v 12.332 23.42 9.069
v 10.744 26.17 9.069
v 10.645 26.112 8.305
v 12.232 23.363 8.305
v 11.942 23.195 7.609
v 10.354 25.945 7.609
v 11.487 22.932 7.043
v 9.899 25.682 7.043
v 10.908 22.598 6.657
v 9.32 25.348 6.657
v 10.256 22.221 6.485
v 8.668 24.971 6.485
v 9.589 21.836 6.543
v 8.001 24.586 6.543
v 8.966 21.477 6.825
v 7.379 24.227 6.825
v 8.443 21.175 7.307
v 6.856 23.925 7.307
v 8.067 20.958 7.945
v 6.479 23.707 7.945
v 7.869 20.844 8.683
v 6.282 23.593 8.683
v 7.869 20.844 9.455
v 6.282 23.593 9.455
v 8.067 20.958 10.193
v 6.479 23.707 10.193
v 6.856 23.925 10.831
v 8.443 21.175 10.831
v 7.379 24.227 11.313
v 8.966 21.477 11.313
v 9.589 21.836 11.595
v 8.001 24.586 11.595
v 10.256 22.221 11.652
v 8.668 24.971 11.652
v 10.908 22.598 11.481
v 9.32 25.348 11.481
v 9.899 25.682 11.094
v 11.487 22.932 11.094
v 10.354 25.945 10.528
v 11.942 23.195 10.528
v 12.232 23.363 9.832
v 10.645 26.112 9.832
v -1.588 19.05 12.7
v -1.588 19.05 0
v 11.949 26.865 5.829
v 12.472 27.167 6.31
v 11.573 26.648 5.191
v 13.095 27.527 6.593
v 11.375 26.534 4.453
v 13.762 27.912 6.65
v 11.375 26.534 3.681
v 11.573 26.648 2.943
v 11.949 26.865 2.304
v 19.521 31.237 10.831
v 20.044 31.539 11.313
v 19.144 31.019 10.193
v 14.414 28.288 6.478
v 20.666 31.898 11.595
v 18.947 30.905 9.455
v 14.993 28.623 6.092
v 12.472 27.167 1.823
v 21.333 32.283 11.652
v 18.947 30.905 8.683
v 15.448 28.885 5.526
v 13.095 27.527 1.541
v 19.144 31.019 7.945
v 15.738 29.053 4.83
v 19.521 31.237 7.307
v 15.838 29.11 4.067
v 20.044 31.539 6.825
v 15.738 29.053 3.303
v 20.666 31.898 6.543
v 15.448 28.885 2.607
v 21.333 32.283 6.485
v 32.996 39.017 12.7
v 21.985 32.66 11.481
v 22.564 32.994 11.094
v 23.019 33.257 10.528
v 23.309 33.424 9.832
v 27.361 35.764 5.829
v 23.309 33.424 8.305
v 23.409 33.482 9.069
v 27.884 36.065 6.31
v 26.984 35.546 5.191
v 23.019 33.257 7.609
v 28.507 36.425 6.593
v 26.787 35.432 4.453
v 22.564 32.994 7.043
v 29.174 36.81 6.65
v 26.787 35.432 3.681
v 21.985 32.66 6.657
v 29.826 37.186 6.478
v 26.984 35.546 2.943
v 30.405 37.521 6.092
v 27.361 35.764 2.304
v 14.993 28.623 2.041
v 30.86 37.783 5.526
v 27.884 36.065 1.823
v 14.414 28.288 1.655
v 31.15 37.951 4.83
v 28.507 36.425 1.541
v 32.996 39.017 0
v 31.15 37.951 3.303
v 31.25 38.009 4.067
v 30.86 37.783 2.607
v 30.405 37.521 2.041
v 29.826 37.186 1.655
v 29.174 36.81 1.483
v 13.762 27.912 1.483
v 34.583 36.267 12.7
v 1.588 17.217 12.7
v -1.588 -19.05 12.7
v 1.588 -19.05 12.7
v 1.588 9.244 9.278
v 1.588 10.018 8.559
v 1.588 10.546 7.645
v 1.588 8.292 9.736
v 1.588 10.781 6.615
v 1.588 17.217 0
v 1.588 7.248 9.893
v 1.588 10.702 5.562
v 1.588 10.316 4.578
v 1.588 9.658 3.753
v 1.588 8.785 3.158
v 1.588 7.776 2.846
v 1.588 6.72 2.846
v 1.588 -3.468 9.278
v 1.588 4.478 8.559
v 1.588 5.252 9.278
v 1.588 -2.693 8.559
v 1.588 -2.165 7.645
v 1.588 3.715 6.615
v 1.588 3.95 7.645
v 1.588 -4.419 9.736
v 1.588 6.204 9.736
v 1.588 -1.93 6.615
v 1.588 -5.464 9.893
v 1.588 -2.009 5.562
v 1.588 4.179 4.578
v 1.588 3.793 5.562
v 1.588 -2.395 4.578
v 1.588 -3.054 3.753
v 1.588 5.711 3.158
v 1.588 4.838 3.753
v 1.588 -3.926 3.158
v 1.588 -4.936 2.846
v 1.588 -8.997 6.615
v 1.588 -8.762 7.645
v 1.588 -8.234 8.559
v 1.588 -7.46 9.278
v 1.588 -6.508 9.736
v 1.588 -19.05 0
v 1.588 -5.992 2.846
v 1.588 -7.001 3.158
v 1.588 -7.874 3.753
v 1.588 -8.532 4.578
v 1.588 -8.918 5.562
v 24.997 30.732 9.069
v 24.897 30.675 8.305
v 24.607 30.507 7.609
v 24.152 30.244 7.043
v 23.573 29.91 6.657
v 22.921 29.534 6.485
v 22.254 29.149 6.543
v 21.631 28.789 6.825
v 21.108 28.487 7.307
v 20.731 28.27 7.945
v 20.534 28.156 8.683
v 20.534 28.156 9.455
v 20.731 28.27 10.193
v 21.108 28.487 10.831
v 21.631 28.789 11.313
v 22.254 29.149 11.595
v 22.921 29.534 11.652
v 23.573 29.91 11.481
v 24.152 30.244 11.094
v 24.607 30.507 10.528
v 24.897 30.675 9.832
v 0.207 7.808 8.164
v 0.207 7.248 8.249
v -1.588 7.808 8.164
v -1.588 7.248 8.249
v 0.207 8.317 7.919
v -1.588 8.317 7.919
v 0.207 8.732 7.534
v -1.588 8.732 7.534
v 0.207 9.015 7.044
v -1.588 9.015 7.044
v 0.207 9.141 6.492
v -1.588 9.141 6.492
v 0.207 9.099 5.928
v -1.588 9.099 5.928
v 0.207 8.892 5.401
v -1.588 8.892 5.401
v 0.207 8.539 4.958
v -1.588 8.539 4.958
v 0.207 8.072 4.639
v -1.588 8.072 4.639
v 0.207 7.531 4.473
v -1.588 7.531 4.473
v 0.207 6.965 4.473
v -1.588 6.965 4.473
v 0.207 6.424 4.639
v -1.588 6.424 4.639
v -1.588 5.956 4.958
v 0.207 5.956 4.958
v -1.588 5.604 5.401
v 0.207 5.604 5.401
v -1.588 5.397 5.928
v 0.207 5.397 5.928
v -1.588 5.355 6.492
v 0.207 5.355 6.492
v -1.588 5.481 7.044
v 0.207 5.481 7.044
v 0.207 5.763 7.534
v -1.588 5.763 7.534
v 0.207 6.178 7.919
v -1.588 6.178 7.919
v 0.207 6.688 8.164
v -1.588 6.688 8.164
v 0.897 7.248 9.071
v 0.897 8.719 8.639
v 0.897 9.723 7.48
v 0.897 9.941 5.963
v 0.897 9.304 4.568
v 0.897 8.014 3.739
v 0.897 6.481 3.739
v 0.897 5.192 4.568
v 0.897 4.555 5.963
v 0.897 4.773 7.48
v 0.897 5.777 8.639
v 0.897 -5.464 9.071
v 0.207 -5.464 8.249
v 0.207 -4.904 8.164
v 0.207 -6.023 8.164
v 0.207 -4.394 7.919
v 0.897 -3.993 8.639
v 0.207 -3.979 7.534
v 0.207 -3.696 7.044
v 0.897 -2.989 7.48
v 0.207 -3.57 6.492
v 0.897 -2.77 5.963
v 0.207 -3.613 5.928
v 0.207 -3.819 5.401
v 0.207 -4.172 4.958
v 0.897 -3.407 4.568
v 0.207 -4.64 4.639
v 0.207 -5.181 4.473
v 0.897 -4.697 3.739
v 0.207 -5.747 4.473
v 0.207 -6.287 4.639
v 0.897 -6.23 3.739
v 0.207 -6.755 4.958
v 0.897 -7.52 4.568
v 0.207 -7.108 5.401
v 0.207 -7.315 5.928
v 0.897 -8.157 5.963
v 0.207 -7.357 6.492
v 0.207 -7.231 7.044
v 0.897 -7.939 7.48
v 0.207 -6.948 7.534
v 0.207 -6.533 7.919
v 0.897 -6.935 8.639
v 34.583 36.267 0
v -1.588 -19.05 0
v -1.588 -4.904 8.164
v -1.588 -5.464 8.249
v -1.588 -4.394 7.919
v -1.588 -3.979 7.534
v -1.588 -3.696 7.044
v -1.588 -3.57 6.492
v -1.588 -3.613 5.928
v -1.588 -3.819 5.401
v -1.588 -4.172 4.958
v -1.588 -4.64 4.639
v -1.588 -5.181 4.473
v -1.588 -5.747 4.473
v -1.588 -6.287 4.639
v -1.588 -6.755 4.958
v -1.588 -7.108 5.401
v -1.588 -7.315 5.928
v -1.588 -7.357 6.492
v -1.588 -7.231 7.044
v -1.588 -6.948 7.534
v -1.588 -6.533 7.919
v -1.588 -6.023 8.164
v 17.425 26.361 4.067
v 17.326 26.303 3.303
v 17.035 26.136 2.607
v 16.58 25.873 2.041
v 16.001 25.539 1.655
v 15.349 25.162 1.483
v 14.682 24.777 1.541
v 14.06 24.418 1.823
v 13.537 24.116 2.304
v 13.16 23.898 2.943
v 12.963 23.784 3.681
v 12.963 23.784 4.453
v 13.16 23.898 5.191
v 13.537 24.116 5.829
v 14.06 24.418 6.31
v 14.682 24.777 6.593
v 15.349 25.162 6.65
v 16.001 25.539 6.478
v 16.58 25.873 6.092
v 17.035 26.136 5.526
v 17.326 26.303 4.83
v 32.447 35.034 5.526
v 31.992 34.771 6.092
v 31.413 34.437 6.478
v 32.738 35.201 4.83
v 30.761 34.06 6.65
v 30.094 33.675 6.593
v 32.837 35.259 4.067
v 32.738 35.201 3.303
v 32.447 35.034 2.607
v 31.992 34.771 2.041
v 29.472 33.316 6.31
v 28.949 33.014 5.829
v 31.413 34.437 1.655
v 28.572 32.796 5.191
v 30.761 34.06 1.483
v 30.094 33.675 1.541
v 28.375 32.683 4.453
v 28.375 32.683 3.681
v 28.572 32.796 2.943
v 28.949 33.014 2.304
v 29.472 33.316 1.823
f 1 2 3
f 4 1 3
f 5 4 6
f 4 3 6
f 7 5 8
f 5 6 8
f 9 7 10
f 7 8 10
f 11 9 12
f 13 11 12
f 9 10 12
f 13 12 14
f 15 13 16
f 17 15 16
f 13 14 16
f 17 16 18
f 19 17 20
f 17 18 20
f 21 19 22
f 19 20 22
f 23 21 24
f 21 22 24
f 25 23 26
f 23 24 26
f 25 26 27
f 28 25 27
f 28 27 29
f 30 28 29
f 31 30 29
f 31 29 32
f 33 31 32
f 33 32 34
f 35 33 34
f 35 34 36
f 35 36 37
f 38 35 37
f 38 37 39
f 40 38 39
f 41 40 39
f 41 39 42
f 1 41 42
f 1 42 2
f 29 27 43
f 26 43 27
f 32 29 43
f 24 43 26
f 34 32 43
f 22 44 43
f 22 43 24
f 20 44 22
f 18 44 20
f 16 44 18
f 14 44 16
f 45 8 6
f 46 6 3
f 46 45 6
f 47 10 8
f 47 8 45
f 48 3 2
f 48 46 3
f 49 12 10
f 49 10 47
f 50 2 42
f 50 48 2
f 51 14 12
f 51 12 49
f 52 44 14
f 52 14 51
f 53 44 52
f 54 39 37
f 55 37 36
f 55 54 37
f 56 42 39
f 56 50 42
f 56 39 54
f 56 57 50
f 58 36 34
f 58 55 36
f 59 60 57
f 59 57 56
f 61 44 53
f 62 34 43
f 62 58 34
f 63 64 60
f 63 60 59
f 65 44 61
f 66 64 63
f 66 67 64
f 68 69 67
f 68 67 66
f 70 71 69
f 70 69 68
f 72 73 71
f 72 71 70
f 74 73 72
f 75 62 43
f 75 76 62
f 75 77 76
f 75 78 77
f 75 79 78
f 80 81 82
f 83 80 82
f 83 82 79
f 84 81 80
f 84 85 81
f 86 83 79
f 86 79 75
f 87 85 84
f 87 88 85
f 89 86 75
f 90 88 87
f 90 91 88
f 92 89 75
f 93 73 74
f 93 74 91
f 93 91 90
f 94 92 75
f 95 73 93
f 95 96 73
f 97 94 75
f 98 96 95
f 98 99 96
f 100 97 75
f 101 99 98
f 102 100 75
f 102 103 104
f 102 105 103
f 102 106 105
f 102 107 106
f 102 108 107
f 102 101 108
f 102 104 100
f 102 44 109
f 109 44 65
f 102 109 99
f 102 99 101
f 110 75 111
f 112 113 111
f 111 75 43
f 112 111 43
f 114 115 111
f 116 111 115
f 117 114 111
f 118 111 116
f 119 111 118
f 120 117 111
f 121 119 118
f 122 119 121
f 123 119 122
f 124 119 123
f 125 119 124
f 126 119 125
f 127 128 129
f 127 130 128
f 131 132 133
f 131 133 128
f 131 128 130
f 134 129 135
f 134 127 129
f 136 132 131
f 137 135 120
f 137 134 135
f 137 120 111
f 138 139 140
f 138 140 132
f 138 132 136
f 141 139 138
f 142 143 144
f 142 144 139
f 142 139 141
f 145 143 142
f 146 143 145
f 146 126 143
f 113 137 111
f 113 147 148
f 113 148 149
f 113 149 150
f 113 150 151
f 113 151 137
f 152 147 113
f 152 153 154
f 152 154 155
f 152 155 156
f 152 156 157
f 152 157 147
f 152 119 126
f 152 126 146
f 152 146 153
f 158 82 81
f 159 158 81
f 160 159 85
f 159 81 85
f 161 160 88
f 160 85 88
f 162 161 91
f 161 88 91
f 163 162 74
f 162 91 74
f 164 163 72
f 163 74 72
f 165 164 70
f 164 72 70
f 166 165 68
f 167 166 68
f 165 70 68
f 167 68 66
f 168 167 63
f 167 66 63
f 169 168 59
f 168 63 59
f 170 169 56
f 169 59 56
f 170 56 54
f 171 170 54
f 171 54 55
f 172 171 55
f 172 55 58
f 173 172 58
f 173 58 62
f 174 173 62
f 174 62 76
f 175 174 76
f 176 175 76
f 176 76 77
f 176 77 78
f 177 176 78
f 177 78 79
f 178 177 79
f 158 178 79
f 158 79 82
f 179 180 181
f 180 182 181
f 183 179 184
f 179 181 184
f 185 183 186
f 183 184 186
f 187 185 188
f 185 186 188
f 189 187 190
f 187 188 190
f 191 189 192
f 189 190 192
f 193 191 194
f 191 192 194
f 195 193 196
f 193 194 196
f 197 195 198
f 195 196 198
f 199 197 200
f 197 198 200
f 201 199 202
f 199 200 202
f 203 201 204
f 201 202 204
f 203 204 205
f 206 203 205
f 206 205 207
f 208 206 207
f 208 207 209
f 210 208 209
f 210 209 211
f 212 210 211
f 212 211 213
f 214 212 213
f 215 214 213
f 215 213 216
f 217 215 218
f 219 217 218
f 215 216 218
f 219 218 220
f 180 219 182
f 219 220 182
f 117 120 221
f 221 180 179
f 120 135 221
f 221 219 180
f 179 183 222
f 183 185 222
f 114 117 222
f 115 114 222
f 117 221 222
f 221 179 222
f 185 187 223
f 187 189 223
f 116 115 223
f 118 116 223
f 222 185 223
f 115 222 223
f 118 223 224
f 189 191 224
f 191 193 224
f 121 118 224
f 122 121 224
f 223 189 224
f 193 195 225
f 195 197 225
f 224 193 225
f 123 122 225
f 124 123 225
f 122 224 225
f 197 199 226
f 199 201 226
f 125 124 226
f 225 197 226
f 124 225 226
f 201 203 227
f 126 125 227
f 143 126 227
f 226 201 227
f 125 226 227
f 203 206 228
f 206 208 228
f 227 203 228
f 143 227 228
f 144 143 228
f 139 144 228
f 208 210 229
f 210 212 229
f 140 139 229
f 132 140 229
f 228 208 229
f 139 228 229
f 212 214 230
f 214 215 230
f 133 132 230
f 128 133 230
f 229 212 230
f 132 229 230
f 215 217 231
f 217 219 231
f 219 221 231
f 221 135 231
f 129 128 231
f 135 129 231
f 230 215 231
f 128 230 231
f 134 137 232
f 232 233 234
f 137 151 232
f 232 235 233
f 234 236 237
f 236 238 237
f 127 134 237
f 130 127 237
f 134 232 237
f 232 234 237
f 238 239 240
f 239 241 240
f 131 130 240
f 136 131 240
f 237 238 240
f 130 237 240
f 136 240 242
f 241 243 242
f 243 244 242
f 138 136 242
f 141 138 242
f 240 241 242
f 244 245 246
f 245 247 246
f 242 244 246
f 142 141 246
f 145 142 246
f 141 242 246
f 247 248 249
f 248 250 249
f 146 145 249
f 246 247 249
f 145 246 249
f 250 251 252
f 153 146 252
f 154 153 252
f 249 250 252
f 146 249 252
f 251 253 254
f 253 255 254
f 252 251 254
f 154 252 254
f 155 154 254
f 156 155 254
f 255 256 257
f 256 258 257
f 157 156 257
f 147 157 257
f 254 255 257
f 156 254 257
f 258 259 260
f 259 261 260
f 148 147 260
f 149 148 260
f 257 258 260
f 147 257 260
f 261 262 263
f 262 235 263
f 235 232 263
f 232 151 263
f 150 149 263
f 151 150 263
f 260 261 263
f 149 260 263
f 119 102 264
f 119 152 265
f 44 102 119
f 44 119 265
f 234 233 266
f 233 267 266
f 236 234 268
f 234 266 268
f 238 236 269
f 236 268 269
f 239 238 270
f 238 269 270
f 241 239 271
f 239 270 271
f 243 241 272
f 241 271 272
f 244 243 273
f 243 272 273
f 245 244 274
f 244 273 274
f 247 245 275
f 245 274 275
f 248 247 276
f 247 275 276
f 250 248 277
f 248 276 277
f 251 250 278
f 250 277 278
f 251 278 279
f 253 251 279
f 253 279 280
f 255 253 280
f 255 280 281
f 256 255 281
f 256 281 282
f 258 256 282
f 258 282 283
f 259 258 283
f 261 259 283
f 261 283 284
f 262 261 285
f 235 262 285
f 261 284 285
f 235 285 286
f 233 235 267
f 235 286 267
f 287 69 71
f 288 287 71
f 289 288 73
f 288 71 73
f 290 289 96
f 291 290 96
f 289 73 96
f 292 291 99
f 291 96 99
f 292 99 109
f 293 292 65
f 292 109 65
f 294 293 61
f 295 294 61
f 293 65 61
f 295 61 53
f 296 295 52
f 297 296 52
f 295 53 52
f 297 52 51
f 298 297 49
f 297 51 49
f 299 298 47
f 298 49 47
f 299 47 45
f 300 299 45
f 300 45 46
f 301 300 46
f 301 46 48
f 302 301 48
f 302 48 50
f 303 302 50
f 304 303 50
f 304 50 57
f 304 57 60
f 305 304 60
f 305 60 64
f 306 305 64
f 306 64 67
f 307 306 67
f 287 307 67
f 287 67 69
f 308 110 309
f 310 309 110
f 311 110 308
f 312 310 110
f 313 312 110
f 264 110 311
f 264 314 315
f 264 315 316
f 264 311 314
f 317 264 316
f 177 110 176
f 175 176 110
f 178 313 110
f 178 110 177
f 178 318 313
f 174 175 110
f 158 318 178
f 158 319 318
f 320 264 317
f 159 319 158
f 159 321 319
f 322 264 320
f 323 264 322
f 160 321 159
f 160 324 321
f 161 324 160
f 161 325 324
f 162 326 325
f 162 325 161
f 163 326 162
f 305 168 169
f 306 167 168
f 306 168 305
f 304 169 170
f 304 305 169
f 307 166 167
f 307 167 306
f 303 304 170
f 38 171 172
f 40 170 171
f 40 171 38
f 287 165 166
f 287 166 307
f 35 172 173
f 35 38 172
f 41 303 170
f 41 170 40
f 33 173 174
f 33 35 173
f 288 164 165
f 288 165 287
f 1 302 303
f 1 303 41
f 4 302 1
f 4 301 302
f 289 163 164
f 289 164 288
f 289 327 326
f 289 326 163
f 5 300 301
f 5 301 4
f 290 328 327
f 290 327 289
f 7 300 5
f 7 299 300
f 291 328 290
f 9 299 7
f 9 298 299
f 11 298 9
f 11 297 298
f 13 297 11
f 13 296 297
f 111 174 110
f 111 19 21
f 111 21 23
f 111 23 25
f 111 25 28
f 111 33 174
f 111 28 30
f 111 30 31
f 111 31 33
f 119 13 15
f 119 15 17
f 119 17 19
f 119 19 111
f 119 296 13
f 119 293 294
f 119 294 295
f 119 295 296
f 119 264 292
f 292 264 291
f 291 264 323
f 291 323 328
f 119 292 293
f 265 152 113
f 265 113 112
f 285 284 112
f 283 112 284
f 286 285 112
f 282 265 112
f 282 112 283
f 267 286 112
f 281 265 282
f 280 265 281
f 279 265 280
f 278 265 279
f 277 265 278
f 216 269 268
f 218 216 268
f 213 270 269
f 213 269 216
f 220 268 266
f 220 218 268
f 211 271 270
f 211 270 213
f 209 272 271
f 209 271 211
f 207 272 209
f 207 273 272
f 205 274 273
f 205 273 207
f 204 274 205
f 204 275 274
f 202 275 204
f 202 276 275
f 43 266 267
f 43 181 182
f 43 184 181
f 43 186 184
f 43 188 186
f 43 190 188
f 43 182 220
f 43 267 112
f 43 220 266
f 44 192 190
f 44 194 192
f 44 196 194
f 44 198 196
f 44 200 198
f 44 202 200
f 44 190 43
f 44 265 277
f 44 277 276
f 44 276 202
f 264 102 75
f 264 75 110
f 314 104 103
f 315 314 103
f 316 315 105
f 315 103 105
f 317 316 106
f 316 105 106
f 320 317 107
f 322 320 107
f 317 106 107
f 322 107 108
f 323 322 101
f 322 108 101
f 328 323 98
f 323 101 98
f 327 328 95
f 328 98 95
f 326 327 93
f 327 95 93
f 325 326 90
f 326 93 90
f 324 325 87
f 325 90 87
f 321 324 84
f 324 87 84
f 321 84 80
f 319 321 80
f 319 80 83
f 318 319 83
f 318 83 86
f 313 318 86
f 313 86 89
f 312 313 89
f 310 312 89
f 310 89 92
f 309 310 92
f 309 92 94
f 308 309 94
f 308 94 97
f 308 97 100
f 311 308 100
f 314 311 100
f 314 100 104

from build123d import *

# Parameters (mm, degrees)
BOSS_EXTRUDE1_DEPTH                               = 12.7
CSK_FOR_6_FLAT_HEAD_MACHINE_SCREW_100_D           = 3.7973
CSK_FOR_6_FLAT_HEAD_MACHINE_SCREW_100_DEPTH       = 12.7
CSK_FOR_6_FLAT_HEAD_MACHINE_SCREW_100_CSINK_D     = 7.0866
CSK_FOR_6_FLAT_HEAD_MACHINE_SCREW_100_CSINK_ANGLE = 100
CSK_FOR_6_FLAT_HEAD_MACHINE_SCREW_100_TIP         = 1.140824014
F_6_0_204_DIAMETER_HOLE1_D                        = 5.1816
F_6_0_204_DIAMETER_HOLE1_DEPTH                    = 12.7
F_6_0_204_DIAMETER_HOLE1_TIP                      = 1.556709692


with BuildPart() as part:
    # Sketch1 → Boss-Extrude1 (new body)
    with BuildSketch(Plane.XY):
        Polygon((-1.5875, 19.05), (32.995567884, 39.016543552), (34.583067884, 36.266912895), (1.5875, 17.216912895), (1.5875, -19.05), (-1.5875, -19.05), align=None)
    extrude(amount=BOSS_EXTRUDE1_DEPTH)

    # CSK for #6 Flat Head Machine Screw (100)1
    with Locations(Plane(origin=(1.5875, 0, 0), x_dir=(0, 0, -1), z_dir=(1, 0, 0))):
        with Locations((-6.35, 7.247907124), (-6.35, -5.463667213)):
            CounterSinkHole(CSK_FOR_6_FLAT_HEAD_MACHINE_SCREW_100_D / 2, CSK_FOR_6_FLAT_HEAD_MACHINE_SCREW_100_CSINK_D / 2, depth=CSK_FOR_6_FLAT_HEAD_MACHINE_SCREW_100_DEPTH, counter_sink_angle=CSK_FOR_6_FLAT_HEAD_MACHINE_SCREW_100_CSINK_ANGLE)
            with Locations((0, 0, -(CSK_FOR_6_FLAT_HEAD_MACHINE_SCREW_100_DEPTH + CSK_FOR_6_FLAT_HEAD_MACHINE_SCREW_100_TIP / 2))):  # 118° drill point
                Cone(0, CSK_FOR_6_FLAT_HEAD_MACHINE_SCREW_100_D / 2, CSK_FOR_6_FLAT_HEAD_MACHINE_SCREW_100_TIP, mode=Mode.SUBTRACT)

    # #6 (0.204) Diameter Hole1
    with Locations(Plane(origin=(-7.058266971, 12.225277007, 0), x_dir=(-0.866025404, -0.5, 0), z_dir=(0.5, -0.866025404, 0))):
        with Locations((-43.476510232, -4.066670618), (-34.423038878, -9.068831988), (-25.680281164, -4.066670618), (-19.798832438, -9.068831988)):
            Hole(F_6_0_204_DIAMETER_HOLE1_D / 2, depth=F_6_0_204_DIAMETER_HOLE1_DEPTH)
            with Locations((0, 0, -(F_6_0_204_DIAMETER_HOLE1_DEPTH + F_6_0_204_DIAMETER_HOLE1_TIP / 2))):  # 118° drill point
                Cone(0, F_6_0_204_DIAMETER_HOLE1_D / 2, F_6_0_204_DIAMETER_HOLE1_TIP, mode=Mode.SUBTRACT)


solid = part.part
